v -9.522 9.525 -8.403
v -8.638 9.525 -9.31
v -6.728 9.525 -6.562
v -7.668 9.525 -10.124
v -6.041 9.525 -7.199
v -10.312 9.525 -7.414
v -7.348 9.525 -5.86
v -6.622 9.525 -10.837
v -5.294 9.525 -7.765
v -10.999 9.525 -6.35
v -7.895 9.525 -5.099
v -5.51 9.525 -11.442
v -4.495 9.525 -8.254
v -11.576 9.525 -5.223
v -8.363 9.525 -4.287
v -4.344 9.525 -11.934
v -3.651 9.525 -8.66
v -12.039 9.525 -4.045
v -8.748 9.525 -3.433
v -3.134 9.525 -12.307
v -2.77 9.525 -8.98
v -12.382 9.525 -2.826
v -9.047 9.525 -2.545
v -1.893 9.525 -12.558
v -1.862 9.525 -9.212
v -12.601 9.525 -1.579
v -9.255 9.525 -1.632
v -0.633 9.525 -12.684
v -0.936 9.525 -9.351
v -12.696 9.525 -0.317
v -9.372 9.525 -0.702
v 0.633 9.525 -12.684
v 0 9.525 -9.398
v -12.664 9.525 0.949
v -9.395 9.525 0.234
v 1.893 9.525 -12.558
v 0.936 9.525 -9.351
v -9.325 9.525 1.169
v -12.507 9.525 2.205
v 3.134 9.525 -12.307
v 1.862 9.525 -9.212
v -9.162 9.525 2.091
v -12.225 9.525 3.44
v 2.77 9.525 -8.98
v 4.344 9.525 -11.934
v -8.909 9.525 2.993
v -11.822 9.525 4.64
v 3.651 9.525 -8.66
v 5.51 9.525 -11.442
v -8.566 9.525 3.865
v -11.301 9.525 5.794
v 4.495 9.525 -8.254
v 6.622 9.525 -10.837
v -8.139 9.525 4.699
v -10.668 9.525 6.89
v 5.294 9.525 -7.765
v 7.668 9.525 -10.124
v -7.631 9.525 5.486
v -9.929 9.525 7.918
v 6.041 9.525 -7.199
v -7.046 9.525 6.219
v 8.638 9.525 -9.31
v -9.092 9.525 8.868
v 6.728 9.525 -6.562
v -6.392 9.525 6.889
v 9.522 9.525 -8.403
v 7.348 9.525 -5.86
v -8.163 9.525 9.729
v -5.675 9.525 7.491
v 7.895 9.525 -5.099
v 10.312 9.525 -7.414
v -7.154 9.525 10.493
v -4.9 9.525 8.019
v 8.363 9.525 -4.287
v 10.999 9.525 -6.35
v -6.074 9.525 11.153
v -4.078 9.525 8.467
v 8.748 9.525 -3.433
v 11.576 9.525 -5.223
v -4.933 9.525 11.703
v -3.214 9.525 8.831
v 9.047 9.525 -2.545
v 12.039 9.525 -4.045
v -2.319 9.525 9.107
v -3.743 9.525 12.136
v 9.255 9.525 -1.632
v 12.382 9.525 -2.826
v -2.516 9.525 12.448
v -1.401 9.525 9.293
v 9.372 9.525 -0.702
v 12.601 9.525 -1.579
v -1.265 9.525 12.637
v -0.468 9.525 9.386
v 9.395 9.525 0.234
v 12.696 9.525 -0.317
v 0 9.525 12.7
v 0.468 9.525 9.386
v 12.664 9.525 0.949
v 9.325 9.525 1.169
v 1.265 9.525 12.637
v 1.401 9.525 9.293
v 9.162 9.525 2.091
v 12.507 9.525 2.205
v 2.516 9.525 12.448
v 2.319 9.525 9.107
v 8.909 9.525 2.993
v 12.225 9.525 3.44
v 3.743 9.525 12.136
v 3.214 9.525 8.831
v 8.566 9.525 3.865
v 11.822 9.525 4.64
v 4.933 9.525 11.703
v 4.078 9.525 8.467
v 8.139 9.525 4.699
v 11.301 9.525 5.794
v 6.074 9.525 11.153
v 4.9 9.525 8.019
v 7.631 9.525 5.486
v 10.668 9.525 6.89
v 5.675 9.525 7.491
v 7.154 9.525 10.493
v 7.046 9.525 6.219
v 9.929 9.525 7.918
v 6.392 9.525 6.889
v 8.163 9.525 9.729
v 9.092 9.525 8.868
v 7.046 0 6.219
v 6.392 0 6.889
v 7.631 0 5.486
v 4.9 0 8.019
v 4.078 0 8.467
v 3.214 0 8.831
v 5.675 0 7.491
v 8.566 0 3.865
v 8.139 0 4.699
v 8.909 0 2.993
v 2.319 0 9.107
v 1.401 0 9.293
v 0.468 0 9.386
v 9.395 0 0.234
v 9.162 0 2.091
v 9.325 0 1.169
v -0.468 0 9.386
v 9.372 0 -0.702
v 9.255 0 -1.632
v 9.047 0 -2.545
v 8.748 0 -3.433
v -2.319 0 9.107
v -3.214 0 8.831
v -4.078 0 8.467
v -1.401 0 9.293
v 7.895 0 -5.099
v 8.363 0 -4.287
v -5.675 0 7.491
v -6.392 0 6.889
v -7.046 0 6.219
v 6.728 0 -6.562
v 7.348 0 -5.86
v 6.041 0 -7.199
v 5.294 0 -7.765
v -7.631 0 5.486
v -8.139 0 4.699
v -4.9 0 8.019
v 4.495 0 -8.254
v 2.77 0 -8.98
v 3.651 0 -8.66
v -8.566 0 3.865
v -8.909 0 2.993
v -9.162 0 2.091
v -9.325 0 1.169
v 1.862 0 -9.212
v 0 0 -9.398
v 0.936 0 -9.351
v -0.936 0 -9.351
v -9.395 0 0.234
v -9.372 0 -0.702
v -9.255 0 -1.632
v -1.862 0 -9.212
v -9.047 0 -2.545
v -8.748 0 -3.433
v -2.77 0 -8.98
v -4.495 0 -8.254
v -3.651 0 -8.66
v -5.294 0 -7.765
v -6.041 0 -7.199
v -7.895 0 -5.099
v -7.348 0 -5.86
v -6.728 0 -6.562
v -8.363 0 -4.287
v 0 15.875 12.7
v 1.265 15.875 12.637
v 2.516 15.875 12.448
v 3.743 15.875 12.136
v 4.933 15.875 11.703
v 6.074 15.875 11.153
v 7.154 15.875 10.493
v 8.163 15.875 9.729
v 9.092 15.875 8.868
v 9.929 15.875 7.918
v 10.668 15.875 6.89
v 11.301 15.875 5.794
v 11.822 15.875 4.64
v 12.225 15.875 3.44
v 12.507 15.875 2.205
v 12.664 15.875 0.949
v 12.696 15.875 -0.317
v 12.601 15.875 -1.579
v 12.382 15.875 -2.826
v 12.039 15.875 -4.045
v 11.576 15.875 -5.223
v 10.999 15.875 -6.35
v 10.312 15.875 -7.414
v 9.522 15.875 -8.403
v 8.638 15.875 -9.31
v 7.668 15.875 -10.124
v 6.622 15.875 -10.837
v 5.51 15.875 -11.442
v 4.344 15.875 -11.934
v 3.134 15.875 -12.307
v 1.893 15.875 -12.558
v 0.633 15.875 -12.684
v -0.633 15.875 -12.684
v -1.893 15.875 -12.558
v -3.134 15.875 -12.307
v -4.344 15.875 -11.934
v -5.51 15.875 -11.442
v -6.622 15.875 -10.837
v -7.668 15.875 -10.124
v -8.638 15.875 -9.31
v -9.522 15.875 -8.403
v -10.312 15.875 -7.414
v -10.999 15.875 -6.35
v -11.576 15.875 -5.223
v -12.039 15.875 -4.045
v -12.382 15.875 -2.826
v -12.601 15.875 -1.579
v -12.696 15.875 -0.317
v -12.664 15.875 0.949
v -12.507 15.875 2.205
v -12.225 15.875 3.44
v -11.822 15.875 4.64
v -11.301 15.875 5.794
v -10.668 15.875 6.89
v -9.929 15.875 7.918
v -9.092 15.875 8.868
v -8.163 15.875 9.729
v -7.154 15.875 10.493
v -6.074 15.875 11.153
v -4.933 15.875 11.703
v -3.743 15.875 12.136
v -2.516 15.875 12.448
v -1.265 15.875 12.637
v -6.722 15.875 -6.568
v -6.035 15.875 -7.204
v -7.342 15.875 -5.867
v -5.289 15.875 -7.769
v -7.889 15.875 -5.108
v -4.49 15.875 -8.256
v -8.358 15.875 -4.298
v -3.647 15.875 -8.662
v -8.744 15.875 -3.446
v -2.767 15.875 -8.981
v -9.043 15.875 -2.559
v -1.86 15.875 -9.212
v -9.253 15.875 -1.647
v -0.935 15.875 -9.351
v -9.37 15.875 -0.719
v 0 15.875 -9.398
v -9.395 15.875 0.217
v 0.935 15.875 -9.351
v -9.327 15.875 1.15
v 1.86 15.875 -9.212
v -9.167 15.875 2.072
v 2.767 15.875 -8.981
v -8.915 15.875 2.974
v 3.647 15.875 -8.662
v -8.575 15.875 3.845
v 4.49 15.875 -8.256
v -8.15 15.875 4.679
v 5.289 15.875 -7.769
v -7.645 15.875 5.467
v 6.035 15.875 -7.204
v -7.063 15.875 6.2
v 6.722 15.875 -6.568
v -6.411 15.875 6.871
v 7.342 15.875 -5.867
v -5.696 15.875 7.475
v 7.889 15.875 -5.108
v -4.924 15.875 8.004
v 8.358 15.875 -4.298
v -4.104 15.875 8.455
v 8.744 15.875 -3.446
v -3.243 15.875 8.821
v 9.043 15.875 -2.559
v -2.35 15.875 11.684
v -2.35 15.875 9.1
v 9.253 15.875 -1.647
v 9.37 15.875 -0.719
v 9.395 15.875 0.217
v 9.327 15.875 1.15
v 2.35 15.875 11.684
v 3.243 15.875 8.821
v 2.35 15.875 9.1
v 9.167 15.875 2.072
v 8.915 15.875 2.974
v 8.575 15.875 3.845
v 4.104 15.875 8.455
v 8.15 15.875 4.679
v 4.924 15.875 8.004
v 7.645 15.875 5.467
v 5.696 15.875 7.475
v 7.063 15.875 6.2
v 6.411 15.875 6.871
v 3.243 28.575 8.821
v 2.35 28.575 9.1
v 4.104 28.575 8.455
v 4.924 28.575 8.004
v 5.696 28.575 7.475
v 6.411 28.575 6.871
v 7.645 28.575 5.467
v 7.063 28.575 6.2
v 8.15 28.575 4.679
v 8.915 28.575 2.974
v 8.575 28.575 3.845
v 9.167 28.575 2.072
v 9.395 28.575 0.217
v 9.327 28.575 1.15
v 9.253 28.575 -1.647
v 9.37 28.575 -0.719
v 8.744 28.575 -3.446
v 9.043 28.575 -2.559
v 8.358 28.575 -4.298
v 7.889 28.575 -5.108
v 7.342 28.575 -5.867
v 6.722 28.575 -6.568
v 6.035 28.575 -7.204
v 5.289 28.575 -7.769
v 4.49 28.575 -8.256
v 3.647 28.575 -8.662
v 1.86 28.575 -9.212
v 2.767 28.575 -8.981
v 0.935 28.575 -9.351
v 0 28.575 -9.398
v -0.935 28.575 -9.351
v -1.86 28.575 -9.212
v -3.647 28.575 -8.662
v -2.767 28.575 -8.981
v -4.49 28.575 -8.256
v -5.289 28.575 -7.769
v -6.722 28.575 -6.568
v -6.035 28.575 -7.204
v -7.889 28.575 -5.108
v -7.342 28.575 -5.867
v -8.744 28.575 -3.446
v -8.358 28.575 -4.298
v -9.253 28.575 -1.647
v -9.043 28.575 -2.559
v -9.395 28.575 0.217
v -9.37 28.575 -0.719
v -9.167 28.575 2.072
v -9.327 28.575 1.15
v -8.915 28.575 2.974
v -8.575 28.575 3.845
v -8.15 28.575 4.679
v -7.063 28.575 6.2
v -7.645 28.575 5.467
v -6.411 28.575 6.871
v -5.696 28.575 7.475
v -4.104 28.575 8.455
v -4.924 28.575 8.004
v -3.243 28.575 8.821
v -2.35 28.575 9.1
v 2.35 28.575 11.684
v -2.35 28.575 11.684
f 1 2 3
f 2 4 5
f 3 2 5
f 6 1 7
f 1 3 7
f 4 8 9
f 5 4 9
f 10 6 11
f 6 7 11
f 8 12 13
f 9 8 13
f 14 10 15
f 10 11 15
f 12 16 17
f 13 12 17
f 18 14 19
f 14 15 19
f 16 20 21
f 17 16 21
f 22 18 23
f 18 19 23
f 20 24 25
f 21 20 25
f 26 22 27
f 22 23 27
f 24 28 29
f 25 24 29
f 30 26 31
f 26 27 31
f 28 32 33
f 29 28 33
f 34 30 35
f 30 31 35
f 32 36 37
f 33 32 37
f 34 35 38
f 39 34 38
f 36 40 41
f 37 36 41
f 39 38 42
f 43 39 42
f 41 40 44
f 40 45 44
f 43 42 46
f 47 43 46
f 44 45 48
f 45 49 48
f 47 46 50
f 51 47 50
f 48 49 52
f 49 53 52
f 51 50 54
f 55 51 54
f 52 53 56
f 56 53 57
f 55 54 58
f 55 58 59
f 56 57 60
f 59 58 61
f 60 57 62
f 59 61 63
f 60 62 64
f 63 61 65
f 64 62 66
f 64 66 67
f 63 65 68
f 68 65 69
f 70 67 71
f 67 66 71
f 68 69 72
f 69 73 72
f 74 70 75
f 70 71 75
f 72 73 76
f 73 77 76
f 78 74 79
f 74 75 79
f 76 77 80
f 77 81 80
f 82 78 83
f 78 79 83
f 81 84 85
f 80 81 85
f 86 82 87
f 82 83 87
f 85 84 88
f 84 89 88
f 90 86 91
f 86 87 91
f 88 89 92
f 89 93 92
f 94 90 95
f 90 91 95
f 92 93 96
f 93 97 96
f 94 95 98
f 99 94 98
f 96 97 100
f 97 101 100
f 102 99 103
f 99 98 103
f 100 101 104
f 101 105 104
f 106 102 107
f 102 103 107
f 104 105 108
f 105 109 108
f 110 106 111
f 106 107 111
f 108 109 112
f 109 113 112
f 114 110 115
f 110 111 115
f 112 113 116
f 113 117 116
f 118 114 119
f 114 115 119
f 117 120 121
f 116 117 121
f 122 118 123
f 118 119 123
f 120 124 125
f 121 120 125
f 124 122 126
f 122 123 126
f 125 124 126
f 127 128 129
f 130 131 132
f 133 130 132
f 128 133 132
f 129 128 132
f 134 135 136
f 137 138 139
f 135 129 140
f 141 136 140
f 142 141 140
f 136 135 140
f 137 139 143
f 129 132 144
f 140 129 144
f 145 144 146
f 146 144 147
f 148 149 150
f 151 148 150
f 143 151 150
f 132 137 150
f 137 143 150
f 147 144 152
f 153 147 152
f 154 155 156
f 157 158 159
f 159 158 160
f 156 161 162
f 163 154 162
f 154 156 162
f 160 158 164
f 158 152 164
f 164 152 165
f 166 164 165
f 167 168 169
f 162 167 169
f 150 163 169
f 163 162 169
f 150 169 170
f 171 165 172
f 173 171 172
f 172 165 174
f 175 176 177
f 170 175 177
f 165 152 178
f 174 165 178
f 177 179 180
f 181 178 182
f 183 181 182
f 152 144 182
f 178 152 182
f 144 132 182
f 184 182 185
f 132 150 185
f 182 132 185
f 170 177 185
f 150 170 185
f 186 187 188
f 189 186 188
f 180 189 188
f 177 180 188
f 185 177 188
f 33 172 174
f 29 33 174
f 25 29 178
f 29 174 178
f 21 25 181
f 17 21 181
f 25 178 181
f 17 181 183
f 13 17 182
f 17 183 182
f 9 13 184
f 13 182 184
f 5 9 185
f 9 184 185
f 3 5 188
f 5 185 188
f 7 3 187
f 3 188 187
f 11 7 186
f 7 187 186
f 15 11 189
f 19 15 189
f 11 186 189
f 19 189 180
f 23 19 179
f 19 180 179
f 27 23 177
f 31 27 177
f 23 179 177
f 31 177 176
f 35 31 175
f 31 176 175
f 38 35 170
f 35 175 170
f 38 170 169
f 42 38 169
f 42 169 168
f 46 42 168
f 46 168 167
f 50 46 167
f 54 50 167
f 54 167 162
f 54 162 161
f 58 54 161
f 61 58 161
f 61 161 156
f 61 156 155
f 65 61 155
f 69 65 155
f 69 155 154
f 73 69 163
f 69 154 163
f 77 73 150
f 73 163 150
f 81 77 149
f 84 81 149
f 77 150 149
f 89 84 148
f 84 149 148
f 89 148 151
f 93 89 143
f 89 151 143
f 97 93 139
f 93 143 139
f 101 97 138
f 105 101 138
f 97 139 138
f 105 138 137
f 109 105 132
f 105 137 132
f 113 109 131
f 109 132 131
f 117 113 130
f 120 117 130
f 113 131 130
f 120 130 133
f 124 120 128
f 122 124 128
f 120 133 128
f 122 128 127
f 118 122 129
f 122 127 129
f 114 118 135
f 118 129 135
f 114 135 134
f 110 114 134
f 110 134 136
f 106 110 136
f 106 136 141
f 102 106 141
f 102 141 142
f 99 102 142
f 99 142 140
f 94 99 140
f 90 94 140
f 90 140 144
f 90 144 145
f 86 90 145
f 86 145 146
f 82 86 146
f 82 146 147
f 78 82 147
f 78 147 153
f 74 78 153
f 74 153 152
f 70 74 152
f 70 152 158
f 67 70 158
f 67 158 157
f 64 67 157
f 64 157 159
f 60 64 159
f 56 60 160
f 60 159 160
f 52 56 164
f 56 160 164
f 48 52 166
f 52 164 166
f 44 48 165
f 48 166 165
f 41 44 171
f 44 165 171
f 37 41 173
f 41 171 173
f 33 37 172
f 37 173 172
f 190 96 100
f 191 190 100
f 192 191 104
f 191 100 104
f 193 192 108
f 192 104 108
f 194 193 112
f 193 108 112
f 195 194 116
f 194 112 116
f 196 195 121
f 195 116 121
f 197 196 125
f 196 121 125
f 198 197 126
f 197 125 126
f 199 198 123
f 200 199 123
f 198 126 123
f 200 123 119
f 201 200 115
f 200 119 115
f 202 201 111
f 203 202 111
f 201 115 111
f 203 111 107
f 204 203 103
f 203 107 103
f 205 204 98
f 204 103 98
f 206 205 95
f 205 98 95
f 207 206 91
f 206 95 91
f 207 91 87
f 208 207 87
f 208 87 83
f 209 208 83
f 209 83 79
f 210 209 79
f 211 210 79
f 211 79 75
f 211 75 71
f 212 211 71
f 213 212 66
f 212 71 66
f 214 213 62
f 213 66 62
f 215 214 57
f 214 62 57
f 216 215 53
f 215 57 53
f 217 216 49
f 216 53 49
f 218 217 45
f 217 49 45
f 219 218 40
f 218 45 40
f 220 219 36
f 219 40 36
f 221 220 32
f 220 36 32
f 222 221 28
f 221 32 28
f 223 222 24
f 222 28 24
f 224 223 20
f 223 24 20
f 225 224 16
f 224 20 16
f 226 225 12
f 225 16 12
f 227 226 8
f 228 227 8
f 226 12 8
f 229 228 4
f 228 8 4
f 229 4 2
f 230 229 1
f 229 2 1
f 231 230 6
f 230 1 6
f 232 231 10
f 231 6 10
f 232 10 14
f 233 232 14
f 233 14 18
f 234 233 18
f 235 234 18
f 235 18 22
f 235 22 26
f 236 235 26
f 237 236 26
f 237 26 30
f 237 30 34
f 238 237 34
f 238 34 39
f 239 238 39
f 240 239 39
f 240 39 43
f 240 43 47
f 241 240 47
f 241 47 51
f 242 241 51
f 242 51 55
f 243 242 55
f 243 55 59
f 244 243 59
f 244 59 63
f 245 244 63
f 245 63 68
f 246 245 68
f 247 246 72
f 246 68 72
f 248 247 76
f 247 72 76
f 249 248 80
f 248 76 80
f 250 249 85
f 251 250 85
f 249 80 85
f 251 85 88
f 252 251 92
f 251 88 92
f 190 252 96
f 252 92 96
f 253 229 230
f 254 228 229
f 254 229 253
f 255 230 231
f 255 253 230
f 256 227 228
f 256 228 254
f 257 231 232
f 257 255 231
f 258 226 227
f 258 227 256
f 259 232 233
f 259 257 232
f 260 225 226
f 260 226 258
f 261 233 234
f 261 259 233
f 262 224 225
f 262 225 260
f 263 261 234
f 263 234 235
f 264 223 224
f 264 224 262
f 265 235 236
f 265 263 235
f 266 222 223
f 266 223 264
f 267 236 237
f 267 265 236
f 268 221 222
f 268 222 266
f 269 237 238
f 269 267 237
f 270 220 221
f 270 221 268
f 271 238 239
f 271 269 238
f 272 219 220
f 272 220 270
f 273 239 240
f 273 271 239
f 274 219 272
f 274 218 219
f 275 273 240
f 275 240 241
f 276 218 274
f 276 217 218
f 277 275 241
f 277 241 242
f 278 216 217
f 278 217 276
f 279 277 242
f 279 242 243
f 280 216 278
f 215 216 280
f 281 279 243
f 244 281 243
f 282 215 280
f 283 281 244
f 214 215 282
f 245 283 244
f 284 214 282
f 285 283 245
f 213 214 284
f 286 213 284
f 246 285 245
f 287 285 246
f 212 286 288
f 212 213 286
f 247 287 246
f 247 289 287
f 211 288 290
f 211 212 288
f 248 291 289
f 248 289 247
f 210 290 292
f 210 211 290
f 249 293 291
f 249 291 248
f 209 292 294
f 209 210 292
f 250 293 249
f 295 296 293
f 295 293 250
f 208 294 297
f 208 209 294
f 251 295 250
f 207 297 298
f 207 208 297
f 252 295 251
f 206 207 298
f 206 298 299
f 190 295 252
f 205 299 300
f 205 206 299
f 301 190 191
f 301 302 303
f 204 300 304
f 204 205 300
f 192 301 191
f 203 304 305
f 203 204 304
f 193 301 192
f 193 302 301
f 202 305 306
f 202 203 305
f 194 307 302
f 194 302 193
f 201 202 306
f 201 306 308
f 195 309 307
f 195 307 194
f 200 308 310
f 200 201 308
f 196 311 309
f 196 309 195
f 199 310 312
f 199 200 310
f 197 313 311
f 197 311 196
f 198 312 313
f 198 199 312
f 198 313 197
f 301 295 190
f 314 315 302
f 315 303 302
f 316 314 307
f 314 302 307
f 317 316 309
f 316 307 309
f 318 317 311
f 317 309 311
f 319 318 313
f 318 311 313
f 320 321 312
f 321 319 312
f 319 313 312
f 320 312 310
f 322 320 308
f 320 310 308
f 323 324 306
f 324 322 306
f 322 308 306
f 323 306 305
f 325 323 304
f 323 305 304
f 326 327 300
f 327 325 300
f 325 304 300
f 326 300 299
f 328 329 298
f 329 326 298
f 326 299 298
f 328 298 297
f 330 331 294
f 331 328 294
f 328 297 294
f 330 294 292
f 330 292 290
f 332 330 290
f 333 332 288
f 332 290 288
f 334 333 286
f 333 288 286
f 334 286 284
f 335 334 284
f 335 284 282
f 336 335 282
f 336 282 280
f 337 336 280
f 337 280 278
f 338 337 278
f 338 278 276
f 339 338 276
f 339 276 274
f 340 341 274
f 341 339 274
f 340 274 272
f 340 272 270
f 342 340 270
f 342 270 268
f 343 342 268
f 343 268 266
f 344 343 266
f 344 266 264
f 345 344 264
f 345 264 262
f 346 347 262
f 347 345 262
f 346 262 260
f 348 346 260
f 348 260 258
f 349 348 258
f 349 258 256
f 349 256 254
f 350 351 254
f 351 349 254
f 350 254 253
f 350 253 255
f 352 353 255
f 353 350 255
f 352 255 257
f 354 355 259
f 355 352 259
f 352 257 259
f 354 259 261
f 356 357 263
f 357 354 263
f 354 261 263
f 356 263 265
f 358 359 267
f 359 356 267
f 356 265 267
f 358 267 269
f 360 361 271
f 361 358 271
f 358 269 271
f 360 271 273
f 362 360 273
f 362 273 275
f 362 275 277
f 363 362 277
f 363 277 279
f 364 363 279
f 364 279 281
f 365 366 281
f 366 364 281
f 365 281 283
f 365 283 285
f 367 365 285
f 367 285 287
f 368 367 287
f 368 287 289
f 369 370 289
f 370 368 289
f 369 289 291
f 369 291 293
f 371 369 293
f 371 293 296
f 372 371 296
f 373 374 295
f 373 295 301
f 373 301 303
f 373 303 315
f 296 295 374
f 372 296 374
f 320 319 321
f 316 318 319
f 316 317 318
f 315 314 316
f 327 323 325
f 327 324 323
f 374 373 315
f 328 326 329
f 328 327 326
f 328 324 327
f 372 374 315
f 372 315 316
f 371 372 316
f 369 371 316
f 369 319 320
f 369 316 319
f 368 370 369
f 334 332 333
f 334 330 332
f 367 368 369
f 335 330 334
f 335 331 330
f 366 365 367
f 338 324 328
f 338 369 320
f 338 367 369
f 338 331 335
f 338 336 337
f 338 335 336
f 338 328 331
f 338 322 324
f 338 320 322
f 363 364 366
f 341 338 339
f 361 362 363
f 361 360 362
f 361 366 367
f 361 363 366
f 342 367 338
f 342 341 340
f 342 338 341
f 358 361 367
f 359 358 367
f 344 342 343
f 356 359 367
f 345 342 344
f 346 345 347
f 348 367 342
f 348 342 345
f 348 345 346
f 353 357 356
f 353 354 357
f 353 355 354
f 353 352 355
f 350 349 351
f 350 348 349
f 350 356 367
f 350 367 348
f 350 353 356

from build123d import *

# Parameters (mm, degrees)
SKETCH1_R                = 9.398
BOSS_EXTRUDE1_DEPTH      = 9.525
SKETCH2_R                = 12.7
BOSS_EXTRUDE2_DEPTH      = 6.35
SKETCH3_R                = 9.398
BOSS_EXTRUDE3_DEPTH      = 12.7
BOSS_EXTRUDE4_REACH      = 41.654
BOSS_EXTRUDE4_END_RADIUS = 9.398
SKETCH4_W                = 4.699
SKETCH4_H                = 12.7


with BuildPart() as part:
    # Sketch1 → Boss-Extrude1 (new body)
    with BuildSketch(Plane(origin=(0, 0, 0), x_dir=(1, 0, 0), z_dir=(0, 1, 0))):
        with Locations(Location((0, 0, 0), (0, 0, 90))):
            Circle(SKETCH1_R)
    extrude(amount=BOSS_EXTRUDE1_DEPTH)

    # Sketch2 → Boss-Extrude2 (add)
    with BuildSketch(Plane(origin=(0, 9.525, 0), x_dir=(1, 0, 0), z_dir=(0, 1, 0))):
        with Locations(Location((0, 0, 0), (0, 0, 270))):
            Circle(SKETCH2_R)
    extrude(amount=BOSS_EXTRUDE2_DEPTH)

    # Sketch3 → Boss-Extrude3 (add)
    with BuildSketch(Plane(origin=(0, 15.875, 0), x_dir=(1, 0, 0), z_dir=(0, 1, 0))):
        with Locations(Location((0, 0, 0), (0, 0, 90))):
            Circle(SKETCH3_R)
    extrude(amount=BOSS_EXTRUDE3_DEPTH)

    # Boss-Extrude4: up to this cylinder (the profile starts outside it)
    boss_extrude4_end = Plane(origin=(0, 22.225, 0), z_dir=(0, -1, 0)) * Cylinder(BOSS_EXTRUDE4_END_RADIUS, 103.104, mode=Mode.PRIVATE)
    # Sketch4 → Boss-Extrude4 (add, up to the surface)
    with BuildSketch(Plane.XY.offset(11.684), mode=Mode.PRIVATE) as boss_extrude4_sk1:
        with Locations((0, 22.225)):
            Rectangle(SKETCH4_W, SKETCH4_H)
    boss_extrude4_tool1 = extrude(boss_extrude4_sk1.sketch, amount=-BOSS_EXTRUDE4_REACH, mode=Mode.PRIVATE) - boss_extrude4_end
    add(boss_extrude4_tool1.solids().sort_by_distance((0, 22.225, 11.684))[0])


solid = part.part
